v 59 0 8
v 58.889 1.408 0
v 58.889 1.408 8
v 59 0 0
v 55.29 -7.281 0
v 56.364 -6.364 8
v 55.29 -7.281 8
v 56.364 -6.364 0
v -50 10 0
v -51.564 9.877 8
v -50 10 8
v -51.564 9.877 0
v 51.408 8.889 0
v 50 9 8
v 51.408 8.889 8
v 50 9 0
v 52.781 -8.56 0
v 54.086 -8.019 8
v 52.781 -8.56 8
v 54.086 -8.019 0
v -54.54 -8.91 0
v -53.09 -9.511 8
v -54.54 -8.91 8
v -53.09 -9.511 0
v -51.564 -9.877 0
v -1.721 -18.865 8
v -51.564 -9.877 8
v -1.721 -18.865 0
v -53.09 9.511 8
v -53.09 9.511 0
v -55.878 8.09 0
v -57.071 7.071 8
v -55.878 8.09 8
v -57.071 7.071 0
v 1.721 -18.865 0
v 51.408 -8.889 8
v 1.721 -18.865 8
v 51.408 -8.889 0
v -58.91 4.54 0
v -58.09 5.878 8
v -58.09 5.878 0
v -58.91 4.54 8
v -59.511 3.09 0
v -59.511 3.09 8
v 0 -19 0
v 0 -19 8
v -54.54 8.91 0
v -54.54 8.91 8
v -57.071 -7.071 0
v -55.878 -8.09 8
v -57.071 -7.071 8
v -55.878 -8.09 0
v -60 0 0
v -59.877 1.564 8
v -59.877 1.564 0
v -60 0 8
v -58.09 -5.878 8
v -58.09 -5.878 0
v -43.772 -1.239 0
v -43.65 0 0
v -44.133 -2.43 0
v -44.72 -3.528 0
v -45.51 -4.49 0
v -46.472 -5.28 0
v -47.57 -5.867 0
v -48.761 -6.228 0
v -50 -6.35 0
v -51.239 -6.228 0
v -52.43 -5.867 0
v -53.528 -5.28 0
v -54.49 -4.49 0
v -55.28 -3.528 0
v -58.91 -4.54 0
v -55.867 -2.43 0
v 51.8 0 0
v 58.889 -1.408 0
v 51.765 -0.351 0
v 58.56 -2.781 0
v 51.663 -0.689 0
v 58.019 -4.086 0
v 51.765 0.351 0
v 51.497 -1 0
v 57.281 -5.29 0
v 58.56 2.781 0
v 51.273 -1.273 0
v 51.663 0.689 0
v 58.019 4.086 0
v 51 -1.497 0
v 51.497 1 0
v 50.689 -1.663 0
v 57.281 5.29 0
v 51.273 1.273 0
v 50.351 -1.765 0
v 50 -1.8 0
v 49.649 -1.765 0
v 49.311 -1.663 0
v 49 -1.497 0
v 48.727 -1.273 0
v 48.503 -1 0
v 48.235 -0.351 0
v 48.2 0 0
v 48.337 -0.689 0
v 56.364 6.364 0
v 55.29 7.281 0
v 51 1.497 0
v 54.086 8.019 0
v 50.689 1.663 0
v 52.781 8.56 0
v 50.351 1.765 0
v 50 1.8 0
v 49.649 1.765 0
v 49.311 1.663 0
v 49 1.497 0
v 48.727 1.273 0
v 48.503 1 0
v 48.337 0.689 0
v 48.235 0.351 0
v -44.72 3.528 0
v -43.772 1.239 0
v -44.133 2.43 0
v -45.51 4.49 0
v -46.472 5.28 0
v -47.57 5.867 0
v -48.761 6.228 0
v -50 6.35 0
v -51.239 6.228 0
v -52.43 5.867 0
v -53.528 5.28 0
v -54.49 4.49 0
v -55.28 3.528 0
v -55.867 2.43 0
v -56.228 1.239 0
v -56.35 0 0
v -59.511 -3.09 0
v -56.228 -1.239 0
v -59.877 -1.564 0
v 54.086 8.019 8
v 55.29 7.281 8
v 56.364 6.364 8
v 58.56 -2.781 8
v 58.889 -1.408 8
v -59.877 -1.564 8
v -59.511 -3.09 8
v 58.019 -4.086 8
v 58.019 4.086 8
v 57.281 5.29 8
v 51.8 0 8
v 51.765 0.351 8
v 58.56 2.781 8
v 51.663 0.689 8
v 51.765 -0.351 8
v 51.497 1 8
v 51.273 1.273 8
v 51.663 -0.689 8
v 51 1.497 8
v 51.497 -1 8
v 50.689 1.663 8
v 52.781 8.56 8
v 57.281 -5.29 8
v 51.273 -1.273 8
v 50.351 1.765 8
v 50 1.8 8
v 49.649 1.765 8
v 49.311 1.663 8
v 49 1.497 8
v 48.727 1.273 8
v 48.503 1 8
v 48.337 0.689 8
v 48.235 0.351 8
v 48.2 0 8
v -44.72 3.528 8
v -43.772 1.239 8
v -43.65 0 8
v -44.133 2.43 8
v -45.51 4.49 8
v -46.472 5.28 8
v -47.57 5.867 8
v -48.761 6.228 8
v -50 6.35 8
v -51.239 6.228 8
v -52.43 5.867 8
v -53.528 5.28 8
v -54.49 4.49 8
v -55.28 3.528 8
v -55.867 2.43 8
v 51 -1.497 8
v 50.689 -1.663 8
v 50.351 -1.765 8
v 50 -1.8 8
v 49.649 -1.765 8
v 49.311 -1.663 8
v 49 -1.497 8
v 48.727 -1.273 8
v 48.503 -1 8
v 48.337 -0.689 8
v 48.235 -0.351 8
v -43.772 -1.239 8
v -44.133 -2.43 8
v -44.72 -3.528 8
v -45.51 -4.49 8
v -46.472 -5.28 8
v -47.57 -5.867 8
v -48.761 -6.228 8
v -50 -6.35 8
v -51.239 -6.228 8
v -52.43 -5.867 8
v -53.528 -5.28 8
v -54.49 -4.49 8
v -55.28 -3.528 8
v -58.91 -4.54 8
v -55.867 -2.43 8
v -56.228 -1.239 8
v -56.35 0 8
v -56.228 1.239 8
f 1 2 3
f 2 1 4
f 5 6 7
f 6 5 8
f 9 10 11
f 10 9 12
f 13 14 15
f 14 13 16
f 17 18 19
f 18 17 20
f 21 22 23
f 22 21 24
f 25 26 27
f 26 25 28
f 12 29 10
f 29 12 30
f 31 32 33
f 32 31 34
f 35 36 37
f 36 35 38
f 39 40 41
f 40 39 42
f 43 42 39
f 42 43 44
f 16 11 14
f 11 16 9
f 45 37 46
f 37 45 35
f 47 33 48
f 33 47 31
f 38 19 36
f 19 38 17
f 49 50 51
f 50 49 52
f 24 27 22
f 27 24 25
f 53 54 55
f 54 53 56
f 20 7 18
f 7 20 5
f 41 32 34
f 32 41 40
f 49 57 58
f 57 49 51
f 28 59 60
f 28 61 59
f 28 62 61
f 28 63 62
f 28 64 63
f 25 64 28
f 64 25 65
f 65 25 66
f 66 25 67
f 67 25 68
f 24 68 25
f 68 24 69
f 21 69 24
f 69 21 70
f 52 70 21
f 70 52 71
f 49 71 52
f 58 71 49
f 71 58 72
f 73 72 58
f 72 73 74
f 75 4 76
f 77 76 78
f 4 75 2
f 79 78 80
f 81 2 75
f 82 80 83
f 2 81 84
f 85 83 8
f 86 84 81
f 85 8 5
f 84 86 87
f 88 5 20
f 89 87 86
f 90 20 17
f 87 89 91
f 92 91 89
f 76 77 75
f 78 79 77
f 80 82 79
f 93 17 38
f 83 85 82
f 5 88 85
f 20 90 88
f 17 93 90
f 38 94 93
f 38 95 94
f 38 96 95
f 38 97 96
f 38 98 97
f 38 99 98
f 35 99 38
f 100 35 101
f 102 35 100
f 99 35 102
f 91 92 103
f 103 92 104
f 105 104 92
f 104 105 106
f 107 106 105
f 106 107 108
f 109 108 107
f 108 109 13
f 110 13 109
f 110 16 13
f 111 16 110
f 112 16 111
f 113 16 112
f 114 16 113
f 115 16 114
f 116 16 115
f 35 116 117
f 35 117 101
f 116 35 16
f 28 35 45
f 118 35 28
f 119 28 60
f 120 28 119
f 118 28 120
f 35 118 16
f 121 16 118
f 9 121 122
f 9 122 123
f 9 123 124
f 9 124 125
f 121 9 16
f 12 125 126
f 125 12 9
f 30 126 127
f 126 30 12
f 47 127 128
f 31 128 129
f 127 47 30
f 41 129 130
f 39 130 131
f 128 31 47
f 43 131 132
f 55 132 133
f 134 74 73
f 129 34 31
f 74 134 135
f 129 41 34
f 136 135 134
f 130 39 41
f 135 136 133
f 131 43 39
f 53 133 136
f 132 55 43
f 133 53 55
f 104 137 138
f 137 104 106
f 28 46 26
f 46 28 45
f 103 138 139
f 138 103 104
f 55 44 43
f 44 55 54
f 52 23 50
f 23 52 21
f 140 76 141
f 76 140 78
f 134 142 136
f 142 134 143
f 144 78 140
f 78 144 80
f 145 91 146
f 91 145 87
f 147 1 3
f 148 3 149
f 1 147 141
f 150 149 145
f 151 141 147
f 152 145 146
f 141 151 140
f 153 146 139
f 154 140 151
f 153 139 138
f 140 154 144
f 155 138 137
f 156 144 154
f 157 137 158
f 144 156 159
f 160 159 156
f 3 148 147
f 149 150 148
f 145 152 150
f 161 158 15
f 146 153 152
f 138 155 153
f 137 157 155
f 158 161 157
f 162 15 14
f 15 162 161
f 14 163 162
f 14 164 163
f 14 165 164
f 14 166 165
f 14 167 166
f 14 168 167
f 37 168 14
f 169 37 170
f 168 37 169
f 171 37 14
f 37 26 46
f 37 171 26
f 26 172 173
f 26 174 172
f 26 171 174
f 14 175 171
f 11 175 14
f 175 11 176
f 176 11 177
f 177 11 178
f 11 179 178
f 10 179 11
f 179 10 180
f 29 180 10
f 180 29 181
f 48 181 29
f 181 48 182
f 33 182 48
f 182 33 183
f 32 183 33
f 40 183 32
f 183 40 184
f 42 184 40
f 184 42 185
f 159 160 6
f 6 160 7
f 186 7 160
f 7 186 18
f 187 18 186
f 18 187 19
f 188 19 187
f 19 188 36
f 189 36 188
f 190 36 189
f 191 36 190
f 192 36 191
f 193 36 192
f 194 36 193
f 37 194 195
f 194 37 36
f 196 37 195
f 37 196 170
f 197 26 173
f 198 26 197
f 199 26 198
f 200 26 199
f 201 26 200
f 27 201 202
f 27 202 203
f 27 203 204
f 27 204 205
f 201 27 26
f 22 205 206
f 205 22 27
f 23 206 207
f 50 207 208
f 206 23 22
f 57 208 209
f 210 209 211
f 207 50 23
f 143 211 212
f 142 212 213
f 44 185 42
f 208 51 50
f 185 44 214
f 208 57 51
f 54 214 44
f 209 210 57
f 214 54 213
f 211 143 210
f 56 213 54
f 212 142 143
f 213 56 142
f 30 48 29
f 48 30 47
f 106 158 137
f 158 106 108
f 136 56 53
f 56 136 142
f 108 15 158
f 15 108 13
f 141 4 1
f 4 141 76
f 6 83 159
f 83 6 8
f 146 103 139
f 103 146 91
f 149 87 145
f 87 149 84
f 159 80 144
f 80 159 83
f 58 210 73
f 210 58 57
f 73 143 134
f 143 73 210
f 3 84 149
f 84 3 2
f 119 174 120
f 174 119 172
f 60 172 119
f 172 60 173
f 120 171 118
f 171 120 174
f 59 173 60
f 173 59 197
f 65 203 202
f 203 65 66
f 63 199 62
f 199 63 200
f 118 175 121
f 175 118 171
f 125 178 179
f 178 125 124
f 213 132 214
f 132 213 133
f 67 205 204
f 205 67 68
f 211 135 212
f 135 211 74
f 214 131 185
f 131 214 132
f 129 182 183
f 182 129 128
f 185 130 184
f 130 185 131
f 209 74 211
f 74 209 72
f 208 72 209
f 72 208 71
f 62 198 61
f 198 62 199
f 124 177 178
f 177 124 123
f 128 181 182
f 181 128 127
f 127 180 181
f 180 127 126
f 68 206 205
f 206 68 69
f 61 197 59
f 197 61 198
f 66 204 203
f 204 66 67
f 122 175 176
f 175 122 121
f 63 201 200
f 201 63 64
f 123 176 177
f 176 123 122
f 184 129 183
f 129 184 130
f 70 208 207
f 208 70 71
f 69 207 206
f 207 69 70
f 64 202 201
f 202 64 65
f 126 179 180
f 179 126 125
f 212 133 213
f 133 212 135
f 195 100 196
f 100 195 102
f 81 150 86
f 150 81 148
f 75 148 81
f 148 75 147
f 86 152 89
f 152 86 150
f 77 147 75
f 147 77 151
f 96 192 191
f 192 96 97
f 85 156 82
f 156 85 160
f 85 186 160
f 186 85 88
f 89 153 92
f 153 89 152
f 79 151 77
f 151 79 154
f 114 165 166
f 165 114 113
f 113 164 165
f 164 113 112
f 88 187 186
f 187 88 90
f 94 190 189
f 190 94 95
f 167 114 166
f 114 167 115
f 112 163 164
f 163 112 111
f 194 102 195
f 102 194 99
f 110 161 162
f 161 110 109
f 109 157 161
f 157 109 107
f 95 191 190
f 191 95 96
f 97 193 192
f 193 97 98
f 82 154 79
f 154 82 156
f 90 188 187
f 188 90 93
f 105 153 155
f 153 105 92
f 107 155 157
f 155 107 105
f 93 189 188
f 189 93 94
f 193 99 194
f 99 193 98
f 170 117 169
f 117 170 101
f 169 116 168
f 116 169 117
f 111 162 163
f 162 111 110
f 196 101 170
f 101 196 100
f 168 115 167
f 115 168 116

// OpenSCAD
$fn = 32;

// ----------------------------------------------------------------------
// Lever: 100 mm between the bosses, 8 mm thick, smooth outline
// ----------------------------------------------------------------------

// --- parameters (mm) ---
lever_l = 100;            // distance between the boss centres
boss_a = 20;              // first boss diameter
boss_b = 18;              // second boss diameter
bore_a = 12.7;            // first bore
bore_b = 3.6;             // second bore
lever_t = 8;              // lever thickness
boss_c = 22;              // middle boss diameter
bend = 8;                 // how far the middle boss drops

lever_profile = [[-60, 0], [-59.877, -1.564], [-59.511, -3.09], [-58.91, -4.54], [-58.09, -5.878], [-57.071, -7.071], [-55.878, -8.09], [-54.54, -8.91], [-53.09, -9.511], [-51.564, -9.877], [-1.721, -18.865], [0, -19], [1.721, -18.865], [51.408, -8.889], [52.781, -8.56], [54.086, -8.019], [55.29, -7.281], [56.364, -6.364], [57.281, -5.29], [58.019, -4.086], [58.56, -2.781], [58.889, -1.408], [59, 0], [58.889, 1.408], [58.56, 2.781], [58.019, 4.086], [57.281, 5.29], [56.364, 6.364], [55.29, 7.281], [54.086, 8.019], [52.781, 8.56], [51.408, 8.889], [50, 9], [-50, 10], [-51.564, 9.877], [-53.09, 9.511], [-54.54, 8.91], [-55.878, 8.09], [-57.071, 7.071], [-58.09, 5.878], [-58.91, 4.54], [-59.511, 3.09], [-59.877, 1.564]];

difference() {
  linear_extrude(height = lever_t) polygon(lever_profile);
  translate([-50, 0, -2.5]) cylinder(h = lever_t + 5, d = bore_a);
  translate([50, 0, -2.5]) cylinder(h = lever_t + 5, d = bore_b);
}
